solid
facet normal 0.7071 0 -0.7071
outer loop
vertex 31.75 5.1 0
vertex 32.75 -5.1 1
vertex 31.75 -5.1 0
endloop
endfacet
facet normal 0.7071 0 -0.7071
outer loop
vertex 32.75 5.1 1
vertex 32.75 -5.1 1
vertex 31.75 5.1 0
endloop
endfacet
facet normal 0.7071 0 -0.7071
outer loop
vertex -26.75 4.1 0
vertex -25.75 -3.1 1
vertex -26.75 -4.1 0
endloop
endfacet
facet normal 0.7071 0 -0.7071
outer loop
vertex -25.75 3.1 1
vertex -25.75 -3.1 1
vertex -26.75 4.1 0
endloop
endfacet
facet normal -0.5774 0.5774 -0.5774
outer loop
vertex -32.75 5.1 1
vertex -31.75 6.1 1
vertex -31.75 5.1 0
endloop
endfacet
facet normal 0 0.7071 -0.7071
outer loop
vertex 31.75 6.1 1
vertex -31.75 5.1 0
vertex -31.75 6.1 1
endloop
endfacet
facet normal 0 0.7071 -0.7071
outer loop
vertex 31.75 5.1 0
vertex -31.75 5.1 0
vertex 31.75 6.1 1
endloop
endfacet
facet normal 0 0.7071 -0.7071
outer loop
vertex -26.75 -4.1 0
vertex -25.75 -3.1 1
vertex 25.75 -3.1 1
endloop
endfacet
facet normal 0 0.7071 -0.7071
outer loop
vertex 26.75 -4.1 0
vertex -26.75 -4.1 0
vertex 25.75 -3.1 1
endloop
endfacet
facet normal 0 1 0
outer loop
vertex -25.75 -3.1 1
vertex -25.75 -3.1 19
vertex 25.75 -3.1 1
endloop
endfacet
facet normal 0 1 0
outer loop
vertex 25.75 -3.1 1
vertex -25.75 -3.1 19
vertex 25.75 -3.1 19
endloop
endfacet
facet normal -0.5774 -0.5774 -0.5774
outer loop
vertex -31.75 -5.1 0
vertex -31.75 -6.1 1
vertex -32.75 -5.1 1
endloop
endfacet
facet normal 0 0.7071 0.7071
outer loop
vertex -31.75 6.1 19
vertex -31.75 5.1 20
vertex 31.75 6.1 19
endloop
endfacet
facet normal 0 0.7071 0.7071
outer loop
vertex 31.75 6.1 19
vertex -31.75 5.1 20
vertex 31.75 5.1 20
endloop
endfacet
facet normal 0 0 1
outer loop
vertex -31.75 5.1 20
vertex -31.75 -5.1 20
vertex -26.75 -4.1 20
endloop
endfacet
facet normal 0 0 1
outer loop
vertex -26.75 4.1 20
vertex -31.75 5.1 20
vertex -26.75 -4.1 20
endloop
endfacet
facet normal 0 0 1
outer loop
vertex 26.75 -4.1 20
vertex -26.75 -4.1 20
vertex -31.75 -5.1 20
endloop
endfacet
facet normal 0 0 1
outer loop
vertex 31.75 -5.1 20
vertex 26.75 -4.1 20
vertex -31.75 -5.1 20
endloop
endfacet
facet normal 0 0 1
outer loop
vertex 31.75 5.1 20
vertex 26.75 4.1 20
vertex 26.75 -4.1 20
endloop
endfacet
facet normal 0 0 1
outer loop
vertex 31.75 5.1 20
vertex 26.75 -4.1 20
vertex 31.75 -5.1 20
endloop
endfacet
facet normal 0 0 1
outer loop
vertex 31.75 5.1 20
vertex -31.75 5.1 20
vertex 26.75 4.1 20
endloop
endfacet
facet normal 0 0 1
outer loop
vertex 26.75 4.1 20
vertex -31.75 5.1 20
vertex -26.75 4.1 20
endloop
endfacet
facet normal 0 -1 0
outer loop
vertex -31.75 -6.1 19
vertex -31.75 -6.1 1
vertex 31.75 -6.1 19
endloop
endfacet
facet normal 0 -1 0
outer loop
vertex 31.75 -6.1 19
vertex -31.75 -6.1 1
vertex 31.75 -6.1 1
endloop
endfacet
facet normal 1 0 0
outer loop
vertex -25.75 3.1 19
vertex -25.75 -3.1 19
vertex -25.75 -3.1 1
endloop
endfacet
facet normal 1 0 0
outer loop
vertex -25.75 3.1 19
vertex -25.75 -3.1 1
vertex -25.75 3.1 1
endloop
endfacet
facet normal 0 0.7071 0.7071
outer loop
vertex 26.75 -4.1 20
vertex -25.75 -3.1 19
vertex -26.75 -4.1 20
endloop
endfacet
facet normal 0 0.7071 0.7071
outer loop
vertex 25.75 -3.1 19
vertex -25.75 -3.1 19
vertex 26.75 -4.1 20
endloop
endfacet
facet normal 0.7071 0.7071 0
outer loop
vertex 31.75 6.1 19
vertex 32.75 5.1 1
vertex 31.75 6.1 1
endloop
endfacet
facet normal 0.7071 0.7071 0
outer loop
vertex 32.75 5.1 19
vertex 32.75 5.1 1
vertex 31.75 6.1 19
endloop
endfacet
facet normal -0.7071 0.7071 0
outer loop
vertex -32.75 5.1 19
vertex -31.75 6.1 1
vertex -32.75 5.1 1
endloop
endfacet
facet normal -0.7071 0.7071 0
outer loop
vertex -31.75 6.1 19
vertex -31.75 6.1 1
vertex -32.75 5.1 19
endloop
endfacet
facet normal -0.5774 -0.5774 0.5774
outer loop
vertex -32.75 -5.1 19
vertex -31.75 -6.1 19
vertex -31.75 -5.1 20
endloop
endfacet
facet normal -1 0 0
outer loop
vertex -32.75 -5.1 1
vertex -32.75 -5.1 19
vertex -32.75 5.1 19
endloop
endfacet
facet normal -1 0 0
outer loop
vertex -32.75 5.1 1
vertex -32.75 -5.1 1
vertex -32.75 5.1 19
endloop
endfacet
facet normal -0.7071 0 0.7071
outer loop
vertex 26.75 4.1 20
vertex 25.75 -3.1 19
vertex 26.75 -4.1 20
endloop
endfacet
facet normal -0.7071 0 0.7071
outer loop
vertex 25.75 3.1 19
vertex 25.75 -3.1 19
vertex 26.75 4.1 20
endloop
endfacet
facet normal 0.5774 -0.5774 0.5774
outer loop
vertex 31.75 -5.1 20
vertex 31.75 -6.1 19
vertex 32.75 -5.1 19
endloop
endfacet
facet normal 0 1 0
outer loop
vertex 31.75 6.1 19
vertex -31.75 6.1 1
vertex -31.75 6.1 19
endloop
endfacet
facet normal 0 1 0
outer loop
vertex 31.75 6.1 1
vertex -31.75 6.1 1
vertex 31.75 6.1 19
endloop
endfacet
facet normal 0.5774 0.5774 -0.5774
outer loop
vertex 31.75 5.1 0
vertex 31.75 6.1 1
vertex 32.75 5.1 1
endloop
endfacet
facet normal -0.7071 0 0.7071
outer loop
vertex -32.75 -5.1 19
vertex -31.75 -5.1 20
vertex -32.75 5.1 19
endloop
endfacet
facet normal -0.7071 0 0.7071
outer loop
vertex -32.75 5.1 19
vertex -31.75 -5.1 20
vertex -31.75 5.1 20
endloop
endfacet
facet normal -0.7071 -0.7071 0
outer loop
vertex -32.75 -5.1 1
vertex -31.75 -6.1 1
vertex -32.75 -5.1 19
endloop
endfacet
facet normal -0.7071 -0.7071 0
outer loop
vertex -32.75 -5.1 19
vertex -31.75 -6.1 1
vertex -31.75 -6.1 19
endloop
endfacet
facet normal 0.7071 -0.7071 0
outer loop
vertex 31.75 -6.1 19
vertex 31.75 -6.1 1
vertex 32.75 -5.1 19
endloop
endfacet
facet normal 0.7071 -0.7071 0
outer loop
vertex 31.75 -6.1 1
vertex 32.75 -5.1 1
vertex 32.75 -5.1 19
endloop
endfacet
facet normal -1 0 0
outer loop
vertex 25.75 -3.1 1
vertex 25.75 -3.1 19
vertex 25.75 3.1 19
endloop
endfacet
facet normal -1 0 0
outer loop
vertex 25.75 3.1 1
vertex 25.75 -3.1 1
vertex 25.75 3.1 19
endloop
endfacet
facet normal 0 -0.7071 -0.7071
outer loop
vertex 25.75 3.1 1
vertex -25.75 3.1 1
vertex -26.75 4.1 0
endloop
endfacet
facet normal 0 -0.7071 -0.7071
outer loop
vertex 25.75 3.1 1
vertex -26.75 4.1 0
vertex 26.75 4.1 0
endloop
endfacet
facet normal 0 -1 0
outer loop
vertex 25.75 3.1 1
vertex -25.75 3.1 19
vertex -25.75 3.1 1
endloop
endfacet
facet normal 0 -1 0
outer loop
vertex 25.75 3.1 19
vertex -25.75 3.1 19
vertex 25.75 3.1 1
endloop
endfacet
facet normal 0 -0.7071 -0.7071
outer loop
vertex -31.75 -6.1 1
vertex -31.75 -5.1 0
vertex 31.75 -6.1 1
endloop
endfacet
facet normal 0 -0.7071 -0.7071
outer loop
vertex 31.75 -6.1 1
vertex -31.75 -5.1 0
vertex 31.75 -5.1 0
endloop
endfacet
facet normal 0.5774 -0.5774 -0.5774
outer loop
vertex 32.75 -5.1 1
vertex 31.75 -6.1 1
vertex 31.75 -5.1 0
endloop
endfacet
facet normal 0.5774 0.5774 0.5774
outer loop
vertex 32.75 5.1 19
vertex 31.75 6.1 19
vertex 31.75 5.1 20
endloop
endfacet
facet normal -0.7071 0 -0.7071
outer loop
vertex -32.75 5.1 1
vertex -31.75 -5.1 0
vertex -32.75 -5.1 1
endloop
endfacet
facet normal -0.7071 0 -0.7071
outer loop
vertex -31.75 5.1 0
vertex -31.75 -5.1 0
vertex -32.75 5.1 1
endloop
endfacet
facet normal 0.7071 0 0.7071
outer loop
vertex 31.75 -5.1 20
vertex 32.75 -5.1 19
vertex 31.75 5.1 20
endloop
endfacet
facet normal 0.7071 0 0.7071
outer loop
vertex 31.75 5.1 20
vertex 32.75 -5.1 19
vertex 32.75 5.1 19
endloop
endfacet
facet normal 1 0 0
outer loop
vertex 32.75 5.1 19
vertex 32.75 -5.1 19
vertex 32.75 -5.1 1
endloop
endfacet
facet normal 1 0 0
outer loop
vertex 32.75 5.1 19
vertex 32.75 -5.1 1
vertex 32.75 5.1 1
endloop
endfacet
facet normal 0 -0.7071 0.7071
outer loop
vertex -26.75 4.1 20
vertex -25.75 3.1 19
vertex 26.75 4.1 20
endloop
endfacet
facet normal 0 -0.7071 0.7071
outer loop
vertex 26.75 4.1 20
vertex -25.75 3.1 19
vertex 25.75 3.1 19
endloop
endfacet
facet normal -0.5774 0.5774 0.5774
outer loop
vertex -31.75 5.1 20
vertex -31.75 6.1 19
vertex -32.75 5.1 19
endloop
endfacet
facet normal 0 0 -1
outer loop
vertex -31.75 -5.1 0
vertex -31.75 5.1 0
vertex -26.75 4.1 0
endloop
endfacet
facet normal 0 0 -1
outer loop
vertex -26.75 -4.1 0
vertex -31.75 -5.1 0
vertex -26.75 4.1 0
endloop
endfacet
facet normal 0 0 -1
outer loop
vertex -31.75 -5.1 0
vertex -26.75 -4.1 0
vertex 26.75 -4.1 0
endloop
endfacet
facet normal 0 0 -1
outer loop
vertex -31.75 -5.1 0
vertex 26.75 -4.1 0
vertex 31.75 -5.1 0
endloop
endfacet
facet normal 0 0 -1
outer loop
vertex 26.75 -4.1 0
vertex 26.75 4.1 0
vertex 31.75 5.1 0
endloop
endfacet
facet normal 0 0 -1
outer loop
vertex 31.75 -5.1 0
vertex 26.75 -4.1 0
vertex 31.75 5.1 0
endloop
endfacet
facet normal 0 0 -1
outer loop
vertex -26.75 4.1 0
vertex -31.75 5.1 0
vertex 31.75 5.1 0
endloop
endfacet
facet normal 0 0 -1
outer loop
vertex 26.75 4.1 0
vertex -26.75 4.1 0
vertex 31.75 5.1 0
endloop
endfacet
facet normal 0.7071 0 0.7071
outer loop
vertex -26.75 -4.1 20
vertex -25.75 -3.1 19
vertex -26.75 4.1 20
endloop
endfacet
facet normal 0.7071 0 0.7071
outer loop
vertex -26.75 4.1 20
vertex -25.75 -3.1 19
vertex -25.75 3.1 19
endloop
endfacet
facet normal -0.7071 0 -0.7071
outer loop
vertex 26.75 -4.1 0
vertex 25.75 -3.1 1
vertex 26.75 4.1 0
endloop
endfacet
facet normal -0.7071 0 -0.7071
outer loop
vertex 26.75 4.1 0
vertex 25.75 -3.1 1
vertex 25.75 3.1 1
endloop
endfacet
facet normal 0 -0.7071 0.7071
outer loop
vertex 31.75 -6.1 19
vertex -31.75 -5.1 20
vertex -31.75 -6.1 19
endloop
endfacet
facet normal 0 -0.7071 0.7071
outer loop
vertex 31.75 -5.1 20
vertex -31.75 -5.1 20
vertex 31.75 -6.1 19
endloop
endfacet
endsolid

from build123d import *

# Parameters (mm, degrees)
SKETCH_W     = 65.5
SKETCH_H     = 12.2
PAD_DEPTH    = 20
SKETCH001_W  = 51.5
SKETCH001_H  = 6.2
POCKET_DEPTH = 20
CHAMFER_SIZE = 1


with BuildPart() as part:
    # Sketch → Pad (new body)
    with BuildSketch(Plane.XY):
        Rectangle(SKETCH_W, SKETCH_H)
    extrude(amount=PAD_DEPTH)

    # Sketch001 (on Face6 of Pad) → Pocket (cut)
    with BuildSketch(Plane.XY.offset(20)):
        Rectangle(SKETCH001_W, SKETCH001_H)
    extrude(amount=-POCKET_DEPTH, mode=Mode.SUBTRACT)

    # Chamfer
    chamfer_edges = [part.edges().sort_by_distance(p)[0] for p in [
        (32.75, -6.1, 10),
        (-32.75, -6.1, 10),
        (0, -6.1, 0),
        (0, -6.1, 20),
        (-32.75, 6.1, 10),
        (32.75, 6.1, 10),
        (0, 6.1, 0),
        (0, 6.1, 20),
        (32.75, 0, 20),
        (32.75, 0, 0),
        (-32.75, 0, 0),
        (-32.75, 0, 20),
        (-25.75, 0, 20),
        (0, -3.1, 20),
        (25.75, 0, 20),
        (0, 3.1, 20),
        (-25.75, 0, 0),
        (0, -3.1, 0),
        (25.75, 0, 0),
        (0, 3.1, 0),
    ]]
    chamfer(chamfer_edges, length=CHAMFER_SIZE)


solid = part.part
